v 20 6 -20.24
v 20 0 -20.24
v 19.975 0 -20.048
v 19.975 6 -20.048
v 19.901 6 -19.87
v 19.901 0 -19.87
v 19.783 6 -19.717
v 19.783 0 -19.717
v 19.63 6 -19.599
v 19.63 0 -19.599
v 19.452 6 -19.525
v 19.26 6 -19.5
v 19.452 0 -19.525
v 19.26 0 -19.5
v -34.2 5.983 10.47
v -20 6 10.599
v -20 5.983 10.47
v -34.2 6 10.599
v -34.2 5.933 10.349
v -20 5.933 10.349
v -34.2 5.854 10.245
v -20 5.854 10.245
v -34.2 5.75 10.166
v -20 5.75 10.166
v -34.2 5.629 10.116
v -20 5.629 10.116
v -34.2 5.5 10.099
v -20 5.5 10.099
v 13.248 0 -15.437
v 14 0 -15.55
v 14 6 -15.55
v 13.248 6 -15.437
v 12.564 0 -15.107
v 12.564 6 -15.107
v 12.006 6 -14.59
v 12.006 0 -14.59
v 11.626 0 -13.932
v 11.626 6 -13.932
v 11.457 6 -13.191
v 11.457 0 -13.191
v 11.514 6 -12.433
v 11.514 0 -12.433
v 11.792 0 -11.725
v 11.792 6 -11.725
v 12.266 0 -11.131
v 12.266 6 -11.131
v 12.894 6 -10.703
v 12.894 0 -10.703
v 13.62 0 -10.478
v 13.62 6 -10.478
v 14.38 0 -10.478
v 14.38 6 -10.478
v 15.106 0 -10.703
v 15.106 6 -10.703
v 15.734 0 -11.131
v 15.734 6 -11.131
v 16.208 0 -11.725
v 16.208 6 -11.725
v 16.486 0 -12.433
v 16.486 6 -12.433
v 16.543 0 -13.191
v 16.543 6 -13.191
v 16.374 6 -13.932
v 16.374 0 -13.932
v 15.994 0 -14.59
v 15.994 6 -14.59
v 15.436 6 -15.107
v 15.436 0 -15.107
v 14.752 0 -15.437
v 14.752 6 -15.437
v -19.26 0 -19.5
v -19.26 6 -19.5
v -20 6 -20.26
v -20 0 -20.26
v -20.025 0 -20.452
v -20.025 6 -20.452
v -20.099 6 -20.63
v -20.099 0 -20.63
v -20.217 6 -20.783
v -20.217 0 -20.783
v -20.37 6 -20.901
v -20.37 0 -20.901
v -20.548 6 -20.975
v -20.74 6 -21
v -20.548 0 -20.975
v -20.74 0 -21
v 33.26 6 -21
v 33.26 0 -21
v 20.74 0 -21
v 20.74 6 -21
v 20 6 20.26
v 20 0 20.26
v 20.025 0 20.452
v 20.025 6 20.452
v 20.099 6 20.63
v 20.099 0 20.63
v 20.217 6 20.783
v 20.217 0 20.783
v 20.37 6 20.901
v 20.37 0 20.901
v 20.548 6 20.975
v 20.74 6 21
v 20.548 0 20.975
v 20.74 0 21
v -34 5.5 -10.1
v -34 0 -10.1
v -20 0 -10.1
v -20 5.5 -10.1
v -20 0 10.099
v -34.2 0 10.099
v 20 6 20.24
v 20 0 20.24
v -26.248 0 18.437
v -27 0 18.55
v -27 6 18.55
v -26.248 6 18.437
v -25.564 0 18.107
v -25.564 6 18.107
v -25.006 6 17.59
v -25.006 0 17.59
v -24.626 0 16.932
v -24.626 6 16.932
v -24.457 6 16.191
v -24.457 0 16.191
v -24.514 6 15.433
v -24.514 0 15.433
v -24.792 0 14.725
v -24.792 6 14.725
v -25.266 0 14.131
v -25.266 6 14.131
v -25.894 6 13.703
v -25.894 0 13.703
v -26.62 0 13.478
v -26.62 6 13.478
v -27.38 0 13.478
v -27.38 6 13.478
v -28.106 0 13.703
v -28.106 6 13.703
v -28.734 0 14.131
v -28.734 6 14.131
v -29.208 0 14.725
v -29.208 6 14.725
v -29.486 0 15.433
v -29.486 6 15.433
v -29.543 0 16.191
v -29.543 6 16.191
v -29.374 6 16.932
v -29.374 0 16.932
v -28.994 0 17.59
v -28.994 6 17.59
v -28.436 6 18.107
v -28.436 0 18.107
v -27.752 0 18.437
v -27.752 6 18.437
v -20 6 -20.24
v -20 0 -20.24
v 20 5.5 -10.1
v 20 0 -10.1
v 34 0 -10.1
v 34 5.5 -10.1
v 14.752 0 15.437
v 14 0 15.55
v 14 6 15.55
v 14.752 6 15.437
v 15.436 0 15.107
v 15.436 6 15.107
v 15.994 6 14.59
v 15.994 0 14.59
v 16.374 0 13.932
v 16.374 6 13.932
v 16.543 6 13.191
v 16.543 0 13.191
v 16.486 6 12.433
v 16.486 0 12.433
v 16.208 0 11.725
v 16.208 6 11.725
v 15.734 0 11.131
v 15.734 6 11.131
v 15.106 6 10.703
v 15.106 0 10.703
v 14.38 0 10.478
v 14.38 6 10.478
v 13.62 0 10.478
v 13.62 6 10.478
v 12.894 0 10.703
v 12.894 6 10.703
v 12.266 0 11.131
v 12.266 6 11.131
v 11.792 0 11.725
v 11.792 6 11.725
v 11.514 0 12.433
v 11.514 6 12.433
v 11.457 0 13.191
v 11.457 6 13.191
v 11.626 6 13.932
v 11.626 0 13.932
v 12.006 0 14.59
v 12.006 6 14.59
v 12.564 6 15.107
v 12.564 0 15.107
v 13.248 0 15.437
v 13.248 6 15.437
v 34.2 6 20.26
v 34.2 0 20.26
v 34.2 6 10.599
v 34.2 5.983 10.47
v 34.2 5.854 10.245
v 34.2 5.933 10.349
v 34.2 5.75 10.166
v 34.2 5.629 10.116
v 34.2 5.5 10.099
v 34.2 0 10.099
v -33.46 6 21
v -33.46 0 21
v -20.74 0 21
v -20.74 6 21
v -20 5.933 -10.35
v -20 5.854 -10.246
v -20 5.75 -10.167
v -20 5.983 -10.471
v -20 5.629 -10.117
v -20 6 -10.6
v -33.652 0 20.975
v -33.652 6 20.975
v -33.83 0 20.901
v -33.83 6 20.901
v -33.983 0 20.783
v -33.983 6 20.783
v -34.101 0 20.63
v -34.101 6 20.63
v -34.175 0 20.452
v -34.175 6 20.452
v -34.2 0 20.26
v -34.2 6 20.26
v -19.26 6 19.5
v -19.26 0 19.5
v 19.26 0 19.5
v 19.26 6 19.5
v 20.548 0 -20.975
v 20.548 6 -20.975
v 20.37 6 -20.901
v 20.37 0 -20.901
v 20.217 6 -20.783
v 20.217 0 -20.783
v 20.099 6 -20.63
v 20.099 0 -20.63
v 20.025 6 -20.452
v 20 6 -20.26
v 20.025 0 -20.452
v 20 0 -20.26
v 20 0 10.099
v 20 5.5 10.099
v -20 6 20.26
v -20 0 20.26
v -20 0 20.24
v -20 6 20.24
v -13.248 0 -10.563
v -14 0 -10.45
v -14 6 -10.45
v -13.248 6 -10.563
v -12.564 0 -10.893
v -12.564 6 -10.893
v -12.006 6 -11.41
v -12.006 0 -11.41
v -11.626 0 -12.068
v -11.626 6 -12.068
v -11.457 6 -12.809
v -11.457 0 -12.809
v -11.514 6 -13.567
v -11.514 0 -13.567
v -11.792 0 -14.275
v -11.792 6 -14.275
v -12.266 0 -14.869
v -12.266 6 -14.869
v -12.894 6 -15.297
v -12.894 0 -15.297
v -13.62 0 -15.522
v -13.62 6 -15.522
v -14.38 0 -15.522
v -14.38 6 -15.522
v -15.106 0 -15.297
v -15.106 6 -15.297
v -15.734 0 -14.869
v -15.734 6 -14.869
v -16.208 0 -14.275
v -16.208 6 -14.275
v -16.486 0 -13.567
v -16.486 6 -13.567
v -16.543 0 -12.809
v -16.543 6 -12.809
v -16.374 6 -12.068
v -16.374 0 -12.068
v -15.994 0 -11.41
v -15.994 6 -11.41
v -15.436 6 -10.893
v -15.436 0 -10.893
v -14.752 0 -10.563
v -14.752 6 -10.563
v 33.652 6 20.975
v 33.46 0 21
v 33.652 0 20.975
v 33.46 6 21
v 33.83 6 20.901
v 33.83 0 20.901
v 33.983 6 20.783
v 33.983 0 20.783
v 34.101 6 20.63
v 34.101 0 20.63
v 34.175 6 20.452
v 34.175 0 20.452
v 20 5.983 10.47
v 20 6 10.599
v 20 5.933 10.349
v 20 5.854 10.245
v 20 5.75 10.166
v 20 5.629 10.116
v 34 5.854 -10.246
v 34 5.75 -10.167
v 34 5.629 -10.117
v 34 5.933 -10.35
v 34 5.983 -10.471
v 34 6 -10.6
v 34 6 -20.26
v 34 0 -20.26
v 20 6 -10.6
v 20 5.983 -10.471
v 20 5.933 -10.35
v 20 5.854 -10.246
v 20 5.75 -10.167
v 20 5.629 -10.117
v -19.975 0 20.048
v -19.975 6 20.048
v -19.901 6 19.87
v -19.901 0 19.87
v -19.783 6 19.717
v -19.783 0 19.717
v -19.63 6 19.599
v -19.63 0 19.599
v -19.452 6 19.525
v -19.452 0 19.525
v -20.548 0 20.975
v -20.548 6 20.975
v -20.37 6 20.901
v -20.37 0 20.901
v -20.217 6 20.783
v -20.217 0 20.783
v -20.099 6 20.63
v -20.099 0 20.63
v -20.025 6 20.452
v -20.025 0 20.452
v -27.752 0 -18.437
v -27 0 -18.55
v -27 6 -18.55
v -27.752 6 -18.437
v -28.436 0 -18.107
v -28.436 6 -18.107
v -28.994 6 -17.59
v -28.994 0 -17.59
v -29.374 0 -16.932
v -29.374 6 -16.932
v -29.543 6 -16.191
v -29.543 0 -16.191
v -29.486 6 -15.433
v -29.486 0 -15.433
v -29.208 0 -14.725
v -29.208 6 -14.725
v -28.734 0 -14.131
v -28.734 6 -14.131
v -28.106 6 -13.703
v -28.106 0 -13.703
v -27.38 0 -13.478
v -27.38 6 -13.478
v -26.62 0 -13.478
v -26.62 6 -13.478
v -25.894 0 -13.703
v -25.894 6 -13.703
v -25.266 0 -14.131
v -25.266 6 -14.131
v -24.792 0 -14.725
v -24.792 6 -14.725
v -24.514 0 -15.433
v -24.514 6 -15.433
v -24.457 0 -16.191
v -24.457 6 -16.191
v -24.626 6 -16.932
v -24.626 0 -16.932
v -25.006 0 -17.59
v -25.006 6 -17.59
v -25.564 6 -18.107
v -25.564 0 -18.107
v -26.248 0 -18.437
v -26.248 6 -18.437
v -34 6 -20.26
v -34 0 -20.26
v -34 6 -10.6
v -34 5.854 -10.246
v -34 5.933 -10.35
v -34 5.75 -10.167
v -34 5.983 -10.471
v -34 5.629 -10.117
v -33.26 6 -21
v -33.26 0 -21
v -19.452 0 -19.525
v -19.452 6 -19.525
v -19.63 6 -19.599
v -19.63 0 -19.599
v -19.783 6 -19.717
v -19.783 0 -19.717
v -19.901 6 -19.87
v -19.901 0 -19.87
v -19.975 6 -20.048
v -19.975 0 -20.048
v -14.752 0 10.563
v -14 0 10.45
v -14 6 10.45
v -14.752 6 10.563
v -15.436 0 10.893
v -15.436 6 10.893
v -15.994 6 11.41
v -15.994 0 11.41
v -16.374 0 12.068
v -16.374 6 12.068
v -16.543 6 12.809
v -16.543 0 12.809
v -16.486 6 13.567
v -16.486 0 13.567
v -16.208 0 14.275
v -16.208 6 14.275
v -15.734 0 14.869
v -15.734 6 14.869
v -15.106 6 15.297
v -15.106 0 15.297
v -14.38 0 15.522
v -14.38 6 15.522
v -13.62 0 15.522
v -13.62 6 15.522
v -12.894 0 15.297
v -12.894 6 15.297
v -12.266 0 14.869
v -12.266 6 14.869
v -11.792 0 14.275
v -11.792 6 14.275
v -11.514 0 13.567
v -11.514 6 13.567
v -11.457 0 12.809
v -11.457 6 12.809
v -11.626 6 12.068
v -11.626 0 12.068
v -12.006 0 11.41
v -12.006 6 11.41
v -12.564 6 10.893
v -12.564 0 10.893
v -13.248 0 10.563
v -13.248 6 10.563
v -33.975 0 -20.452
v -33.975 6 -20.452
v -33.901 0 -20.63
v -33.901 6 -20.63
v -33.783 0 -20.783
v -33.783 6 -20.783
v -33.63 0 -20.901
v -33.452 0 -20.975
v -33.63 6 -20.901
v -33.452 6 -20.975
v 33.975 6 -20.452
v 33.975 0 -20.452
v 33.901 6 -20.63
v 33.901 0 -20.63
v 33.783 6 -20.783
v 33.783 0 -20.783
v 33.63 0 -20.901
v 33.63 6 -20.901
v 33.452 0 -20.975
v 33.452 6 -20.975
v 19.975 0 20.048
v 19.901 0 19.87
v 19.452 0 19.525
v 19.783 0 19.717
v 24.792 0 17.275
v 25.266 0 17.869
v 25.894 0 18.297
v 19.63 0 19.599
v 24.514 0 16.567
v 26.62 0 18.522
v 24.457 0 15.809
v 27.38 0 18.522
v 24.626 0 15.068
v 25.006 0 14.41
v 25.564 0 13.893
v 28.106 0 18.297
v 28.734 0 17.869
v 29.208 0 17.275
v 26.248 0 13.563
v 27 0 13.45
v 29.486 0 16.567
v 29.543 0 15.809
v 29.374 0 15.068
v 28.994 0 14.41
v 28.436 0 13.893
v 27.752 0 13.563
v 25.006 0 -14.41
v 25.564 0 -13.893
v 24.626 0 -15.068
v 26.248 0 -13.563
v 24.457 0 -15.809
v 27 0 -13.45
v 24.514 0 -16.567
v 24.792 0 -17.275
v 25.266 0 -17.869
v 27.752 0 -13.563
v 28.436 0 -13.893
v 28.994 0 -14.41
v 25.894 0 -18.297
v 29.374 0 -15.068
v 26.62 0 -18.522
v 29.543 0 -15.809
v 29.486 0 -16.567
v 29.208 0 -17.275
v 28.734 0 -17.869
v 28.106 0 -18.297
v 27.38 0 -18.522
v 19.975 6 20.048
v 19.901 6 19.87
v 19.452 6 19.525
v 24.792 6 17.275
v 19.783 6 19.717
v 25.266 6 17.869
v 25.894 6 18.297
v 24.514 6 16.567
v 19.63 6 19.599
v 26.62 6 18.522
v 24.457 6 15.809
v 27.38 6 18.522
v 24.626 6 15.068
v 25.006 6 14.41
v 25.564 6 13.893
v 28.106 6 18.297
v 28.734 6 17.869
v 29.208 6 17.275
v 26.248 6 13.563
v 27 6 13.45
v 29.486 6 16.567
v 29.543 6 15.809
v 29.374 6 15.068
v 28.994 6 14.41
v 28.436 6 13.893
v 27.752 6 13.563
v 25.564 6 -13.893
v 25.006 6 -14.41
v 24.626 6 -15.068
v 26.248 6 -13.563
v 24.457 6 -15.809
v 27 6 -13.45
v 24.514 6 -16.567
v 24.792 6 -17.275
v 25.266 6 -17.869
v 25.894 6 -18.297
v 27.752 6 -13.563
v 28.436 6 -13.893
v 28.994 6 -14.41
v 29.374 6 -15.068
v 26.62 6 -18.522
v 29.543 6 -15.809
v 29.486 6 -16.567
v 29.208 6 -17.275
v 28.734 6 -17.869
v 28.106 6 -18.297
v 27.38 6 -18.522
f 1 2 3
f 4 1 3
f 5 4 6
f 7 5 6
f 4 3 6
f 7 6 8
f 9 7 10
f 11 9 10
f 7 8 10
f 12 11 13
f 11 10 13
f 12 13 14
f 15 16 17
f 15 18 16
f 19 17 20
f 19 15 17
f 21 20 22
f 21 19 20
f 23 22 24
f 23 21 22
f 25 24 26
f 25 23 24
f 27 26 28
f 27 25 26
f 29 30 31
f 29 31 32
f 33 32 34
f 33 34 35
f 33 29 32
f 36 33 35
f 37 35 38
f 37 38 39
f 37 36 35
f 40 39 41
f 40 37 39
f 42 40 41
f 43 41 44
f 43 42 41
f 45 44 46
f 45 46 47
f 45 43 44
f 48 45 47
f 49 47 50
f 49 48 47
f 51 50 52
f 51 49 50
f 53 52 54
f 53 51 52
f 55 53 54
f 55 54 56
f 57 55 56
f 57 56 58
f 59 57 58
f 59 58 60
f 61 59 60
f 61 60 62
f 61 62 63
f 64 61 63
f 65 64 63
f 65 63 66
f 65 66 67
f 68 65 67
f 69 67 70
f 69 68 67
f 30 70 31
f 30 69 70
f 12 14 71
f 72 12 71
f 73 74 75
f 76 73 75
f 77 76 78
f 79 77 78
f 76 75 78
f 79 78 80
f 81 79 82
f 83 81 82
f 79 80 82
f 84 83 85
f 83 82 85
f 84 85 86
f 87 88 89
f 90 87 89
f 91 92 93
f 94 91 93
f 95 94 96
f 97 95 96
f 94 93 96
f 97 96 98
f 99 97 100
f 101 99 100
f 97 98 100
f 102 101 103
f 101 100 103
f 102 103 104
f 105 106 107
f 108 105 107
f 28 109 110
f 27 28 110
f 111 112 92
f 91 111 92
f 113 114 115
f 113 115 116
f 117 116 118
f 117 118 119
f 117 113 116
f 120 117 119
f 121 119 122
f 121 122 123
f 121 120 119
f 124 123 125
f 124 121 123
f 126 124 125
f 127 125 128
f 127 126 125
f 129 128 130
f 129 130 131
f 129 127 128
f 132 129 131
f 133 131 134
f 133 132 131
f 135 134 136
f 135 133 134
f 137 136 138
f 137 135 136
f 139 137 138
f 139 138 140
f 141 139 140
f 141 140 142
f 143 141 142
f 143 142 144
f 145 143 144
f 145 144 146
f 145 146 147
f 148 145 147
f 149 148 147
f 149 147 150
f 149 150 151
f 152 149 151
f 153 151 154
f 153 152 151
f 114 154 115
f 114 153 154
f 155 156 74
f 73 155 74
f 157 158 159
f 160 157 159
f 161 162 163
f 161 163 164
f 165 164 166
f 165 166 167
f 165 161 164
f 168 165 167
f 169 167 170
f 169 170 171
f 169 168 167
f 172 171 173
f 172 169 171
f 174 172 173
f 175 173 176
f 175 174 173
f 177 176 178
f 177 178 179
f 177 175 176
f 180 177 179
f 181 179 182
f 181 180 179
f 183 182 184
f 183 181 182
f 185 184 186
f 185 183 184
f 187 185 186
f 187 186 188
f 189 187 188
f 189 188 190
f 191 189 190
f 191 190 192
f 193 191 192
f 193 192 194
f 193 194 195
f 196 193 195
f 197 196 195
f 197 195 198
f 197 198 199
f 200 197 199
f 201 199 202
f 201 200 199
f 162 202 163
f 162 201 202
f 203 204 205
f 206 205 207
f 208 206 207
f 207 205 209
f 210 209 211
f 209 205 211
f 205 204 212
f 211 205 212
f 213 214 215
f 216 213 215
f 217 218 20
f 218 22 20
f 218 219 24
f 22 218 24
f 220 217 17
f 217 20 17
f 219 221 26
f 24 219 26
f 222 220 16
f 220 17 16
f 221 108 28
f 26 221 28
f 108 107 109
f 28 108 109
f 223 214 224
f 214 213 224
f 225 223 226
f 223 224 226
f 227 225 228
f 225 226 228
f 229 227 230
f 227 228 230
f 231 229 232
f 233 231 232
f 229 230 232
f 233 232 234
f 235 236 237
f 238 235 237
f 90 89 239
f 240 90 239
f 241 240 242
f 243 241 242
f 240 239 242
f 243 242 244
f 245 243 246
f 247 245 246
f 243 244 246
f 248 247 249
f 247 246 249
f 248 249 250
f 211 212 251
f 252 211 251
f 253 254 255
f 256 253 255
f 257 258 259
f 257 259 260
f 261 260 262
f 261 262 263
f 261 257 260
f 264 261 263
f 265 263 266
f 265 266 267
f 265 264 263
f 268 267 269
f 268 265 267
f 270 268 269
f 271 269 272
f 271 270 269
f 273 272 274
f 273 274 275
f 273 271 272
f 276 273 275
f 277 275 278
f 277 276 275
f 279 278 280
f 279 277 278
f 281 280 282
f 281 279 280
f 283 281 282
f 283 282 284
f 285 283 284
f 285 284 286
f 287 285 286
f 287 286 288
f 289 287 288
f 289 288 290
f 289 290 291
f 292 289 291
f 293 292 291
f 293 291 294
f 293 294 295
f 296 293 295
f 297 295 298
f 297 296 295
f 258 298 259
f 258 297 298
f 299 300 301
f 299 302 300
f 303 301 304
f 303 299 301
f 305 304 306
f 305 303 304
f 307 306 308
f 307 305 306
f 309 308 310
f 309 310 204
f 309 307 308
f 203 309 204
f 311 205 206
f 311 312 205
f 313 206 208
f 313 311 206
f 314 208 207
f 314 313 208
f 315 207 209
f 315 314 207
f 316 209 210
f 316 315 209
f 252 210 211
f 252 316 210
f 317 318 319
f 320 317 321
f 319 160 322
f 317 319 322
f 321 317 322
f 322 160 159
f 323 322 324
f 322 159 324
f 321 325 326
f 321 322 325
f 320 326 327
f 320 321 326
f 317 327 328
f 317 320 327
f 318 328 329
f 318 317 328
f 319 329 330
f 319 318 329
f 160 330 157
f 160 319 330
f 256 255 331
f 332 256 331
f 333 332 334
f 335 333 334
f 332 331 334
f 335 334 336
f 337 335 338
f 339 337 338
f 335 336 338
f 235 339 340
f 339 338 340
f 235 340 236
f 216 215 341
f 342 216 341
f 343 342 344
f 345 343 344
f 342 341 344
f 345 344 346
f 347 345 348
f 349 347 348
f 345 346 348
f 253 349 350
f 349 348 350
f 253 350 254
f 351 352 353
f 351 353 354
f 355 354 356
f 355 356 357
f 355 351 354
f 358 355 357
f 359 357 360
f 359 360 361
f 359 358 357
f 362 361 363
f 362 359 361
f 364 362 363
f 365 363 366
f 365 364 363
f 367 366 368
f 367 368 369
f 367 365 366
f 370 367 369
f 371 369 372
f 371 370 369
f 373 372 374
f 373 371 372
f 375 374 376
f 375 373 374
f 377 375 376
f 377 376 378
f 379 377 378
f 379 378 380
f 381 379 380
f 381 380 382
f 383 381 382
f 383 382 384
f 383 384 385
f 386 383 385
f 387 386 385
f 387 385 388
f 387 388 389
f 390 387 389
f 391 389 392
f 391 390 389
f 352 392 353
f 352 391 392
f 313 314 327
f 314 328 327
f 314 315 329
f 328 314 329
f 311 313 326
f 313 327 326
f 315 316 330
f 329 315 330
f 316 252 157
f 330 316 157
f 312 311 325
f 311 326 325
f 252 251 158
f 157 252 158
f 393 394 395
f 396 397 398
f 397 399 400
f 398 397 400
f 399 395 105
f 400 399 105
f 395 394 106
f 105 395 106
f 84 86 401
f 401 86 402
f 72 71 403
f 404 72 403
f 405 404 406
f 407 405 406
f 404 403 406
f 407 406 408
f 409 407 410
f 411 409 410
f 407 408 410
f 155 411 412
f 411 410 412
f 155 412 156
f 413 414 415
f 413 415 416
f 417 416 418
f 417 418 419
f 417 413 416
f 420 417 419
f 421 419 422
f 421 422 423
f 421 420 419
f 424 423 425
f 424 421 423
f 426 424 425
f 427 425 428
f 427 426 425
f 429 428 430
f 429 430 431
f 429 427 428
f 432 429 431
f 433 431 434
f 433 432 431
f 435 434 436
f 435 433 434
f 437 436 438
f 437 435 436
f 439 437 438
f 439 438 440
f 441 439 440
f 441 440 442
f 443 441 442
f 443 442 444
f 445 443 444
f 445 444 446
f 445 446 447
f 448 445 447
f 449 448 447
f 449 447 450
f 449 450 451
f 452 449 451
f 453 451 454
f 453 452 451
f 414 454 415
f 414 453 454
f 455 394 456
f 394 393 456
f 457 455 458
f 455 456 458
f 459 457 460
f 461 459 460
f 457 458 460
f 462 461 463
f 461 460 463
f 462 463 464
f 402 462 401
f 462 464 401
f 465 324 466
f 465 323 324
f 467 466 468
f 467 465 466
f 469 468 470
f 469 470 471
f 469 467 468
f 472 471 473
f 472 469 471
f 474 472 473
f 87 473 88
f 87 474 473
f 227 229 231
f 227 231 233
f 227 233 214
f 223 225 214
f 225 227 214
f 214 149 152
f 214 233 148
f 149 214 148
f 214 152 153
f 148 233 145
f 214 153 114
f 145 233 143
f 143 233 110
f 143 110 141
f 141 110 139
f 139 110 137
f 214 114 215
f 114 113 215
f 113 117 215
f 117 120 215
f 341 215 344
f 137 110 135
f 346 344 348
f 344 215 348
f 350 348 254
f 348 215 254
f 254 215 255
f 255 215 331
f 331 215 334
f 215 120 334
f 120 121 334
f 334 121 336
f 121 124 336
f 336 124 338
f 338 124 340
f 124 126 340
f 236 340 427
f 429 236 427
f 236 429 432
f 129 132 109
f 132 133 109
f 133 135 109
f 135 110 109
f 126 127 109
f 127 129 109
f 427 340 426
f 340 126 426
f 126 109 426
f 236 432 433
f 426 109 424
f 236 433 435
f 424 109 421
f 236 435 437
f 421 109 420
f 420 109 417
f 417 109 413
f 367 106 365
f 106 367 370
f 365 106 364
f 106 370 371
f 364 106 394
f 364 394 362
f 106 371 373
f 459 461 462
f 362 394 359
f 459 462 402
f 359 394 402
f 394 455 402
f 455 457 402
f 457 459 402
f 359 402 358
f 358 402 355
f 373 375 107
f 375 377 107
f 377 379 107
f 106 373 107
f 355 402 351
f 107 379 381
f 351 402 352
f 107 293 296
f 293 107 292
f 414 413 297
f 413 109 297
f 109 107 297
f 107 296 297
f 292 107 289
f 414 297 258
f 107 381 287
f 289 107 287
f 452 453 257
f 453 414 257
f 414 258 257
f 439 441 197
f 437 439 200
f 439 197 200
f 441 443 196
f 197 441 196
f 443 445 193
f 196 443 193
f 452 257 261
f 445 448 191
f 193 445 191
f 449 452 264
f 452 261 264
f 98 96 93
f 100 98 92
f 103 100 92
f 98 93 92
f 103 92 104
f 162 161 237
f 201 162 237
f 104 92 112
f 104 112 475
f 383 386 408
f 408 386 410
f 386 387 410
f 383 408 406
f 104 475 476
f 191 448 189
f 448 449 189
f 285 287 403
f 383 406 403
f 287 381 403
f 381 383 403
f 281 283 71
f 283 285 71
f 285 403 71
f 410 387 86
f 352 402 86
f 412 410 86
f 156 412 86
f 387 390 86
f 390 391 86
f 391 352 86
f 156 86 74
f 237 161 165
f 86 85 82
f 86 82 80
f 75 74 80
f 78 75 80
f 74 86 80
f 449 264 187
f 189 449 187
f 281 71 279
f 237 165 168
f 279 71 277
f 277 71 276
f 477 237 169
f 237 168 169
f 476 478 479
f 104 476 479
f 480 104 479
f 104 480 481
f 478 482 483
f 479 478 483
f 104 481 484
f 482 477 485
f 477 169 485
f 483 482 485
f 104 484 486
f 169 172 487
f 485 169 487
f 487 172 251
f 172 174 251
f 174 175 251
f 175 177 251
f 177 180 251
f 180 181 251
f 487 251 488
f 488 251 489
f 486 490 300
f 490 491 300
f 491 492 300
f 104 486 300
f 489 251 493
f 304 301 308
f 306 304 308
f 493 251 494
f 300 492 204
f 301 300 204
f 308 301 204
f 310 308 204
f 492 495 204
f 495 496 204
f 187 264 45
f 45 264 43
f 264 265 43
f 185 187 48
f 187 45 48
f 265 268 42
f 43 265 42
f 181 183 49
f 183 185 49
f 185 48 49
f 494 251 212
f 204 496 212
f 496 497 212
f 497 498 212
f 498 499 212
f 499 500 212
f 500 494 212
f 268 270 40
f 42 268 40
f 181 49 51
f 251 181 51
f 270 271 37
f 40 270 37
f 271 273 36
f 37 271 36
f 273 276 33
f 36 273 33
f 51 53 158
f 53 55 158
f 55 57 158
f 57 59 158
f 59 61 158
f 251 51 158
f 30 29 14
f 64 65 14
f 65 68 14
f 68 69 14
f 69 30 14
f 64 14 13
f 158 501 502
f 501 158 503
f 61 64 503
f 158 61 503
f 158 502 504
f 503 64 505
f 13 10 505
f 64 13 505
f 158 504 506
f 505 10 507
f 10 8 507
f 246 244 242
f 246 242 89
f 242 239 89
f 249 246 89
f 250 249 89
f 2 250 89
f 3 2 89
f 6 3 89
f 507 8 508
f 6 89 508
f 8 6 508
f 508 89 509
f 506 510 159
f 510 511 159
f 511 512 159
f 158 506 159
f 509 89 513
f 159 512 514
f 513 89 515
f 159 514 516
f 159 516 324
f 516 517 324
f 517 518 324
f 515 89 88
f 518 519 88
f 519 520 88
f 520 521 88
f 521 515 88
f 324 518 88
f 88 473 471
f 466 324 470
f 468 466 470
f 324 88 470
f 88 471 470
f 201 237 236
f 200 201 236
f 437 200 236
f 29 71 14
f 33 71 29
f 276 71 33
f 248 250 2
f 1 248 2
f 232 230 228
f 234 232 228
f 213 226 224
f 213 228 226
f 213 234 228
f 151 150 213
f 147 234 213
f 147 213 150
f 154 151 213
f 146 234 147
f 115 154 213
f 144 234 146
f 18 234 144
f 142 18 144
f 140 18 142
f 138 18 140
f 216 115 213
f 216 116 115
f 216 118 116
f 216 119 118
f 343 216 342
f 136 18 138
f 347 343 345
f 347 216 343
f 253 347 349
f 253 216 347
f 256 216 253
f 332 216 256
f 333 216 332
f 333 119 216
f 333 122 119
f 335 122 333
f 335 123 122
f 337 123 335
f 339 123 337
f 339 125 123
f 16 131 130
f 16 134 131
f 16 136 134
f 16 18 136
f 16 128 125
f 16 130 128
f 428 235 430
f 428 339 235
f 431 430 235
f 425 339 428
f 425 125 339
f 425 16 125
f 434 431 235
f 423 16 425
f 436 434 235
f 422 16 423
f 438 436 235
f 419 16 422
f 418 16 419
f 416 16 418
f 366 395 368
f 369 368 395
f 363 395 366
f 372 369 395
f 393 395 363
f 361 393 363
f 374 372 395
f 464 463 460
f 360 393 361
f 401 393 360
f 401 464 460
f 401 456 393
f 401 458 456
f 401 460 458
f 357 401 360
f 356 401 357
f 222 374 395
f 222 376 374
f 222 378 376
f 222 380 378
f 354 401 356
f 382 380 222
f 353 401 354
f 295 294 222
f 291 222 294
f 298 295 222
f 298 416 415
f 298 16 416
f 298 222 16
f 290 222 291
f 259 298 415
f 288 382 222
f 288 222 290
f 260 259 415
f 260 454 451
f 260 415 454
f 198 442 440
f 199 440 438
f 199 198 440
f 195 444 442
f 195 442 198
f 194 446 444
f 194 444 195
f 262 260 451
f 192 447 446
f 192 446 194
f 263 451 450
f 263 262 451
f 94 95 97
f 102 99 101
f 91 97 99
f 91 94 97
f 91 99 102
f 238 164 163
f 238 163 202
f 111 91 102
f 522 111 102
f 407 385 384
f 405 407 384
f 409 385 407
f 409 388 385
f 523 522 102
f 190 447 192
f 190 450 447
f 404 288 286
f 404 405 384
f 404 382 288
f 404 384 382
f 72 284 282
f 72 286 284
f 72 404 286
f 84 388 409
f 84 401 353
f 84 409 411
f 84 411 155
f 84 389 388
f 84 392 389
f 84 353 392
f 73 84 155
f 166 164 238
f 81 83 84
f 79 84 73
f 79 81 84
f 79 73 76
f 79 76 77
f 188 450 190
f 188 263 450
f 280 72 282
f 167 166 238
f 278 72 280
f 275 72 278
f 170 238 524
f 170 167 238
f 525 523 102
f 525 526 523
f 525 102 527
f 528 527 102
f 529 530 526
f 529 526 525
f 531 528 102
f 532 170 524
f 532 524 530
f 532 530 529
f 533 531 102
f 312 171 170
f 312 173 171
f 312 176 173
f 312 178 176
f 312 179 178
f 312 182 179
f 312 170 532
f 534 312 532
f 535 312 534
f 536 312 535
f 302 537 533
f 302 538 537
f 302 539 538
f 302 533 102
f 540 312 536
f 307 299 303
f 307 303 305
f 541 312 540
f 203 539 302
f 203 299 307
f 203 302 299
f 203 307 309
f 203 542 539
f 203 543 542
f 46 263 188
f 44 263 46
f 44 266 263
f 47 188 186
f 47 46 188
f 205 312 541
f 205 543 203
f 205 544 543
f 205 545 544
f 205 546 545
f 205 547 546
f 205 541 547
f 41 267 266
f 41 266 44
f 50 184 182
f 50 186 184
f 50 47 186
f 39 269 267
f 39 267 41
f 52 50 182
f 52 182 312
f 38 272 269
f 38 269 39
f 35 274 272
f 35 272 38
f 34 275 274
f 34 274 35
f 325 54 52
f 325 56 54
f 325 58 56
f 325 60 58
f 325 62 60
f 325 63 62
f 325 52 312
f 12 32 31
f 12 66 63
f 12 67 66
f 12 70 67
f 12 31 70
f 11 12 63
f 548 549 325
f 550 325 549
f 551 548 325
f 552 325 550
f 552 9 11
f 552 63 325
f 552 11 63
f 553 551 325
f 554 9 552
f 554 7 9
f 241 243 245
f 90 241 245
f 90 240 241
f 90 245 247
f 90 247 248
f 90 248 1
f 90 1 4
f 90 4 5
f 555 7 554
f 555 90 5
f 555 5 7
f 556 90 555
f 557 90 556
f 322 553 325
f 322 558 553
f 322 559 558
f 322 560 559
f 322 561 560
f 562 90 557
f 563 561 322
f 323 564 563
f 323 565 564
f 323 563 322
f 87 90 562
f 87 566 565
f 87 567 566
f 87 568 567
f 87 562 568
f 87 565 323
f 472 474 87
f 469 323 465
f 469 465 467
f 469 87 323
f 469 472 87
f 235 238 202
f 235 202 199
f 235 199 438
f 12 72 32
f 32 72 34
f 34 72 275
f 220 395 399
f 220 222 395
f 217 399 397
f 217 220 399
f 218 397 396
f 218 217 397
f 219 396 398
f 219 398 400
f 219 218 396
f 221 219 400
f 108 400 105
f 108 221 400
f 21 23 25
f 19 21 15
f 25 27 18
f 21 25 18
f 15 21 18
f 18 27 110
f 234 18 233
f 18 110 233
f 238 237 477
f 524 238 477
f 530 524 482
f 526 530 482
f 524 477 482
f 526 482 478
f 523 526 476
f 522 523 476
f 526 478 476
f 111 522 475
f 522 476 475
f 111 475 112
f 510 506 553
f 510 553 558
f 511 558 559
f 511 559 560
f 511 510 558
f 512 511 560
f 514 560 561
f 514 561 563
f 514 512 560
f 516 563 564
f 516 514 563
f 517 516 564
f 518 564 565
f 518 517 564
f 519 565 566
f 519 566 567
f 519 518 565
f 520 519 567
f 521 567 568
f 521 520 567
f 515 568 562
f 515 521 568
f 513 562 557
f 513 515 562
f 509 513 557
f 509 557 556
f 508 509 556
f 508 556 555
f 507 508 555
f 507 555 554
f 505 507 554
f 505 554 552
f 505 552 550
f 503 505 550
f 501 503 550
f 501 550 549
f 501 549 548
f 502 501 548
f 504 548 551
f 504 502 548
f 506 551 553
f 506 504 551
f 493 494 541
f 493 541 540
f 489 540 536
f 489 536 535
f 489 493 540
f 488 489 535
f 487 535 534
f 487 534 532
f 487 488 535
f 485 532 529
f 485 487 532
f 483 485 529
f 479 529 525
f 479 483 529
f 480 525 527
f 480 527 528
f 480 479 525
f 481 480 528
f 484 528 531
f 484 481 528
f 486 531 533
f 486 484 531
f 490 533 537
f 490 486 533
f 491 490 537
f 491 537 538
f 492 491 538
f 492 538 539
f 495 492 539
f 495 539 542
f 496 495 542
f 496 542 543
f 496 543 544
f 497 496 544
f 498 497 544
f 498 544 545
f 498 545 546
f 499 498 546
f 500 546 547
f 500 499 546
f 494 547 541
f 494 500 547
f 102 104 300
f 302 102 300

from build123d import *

# Parameters (mm, degrees)
SKETCH1_R           = 2.55
BOSS_EXTRUDE1_DEPTH = 6
FILLET1_R           = 0.74
FILLET2_R           = 0.5


with BuildPart() as part:
    # Sketch1 → Boss-Extrude1 (new body)
    with BuildSketch(Plane(origin=(0, 0, 0), x_dir=(1, 0, 0), z_dir=(0, 1, 0))):
        with BuildLine():
            Line((-19.26, -19.5), (19.26, -19.5))
            ThreePointArc((19.26, -19.5), (19.783259018, -19.716740982), (20, -20.24))
            Line((20, -20.24), (20, -20.26))
            ThreePointArc((20, -20.26), (20.216740982, -20.783259018), (20.74, -21))
            Line((20.74, -21), (34.2, -21))
            Line((34.2, -21), (34.2, -10.099009877))
            Line((34.2, -10.099009877), (20, -10.099009877))
            Line((20, -10.099009877), (20, 10.1))
            Line((20, 10.1), (34, 10.1))
            Line((34, 10.1), (34, 21))
            Line((34, 21), (20.74, 21))
            ThreePointArc((20.74, 21), (20.216740982, 20.783259018), (20, 20.26))
            Line((20, 20.26), (20, 20.24))
            ThreePointArc((20, 20.24), (19.783259018, 19.716740982), (19.26, 19.5))
            Line((19.26, 19.5), (-19.26, 19.5))
            ThreePointArc((-19.26, 19.5), (-19.783259018, 19.716740982), (-20, 20.24))
            Line((-20, 20.24), (-20, 20.26))
            ThreePointArc((-20, 20.26), (-20.216740982, 20.783259018), (-20.74, 21))
            Line((-20.74, 21), (-34, 21))
            Line((-34, 21), (-34, 10.1))
            Line((-34, 10.1), (-20, 10.1))
            Line((-20, 10.1), (-20, -10.099009877))
            Line((-20, -10.099009877), (-34.2, -10.099009877))
            Line((-34.2, -10.099009877), (-34.2, -21))
            Line((-34.2, -21), (-20.74, -21))
            ThreePointArc((-20.74, -21), (-20.216740982, -20.783259018), (-20, -20.26))
            Line((-20, -20.26), (-20, -20.24))
            ThreePointArc((-20, -20.24), (-19.783259018, -19.716740982), (-19.26, -19.5))
        make_face()
        with Locations(Location((-14, 13, 0), (0, 0, 270))):
            Circle(SKETCH1_R, mode=Mode.SUBTRACT)
        with Locations(Location((14, 13, 0), (0, 0, 90))):
            Circle(SKETCH1_R, mode=Mode.SUBTRACT)
        with Locations(Location((14, -13, 0), (0, 0, 270))):
            Circle(SKETCH1_R, mode=Mode.SUBTRACT)
        with Locations(Location((-14, -13, 0), (0, 0, 90))):
            Circle(SKETCH1_R, mode=Mode.SUBTRACT)
        with Locations(Location((27, 16, 0), (0, 0, 270))):
            Circle(SKETCH1_R, mode=Mode.SUBTRACT)
        with Locations(Location((27, -16, 0), (0, 0, 90))):
            Circle(SKETCH1_R, mode=Mode.SUBTRACT)
        with Locations(Location((-27, -16, 0), (0, 0, 270))):
            Circle(SKETCH1_R, mode=Mode.SUBTRACT)
        with Locations(Location((-27, 16, 0), (0, 0, 90))):
            Circle(SKETCH1_R, mode=Mode.SUBTRACT)
    extrude(amount=BOSS_EXTRUDE1_DEPTH)

    # Fillet1
    fillet1_edges = [part.edges().sort_by_distance(p)[0] for p in [
        (34.2, 3, 21),
        (-34.2, 3, 21),
        (-34, 3, -21),
        (34, 3, -21),
    ]]
    fillet(fillet1_edges, radius=FILLET1_R)

    # Fillet2
    fillet2_edges = [part.edges().sort_by_distance(p)[0] for p in [
        (27.1, 6, 10.099009877),
        (-27, 6, -10.1),
        (-27.1, 6, 10.099009877),
        (27, 6, -10.1),
    ]]
    fillet(fillet2_edges, radius=FILLET2_R)


solid = part.part
